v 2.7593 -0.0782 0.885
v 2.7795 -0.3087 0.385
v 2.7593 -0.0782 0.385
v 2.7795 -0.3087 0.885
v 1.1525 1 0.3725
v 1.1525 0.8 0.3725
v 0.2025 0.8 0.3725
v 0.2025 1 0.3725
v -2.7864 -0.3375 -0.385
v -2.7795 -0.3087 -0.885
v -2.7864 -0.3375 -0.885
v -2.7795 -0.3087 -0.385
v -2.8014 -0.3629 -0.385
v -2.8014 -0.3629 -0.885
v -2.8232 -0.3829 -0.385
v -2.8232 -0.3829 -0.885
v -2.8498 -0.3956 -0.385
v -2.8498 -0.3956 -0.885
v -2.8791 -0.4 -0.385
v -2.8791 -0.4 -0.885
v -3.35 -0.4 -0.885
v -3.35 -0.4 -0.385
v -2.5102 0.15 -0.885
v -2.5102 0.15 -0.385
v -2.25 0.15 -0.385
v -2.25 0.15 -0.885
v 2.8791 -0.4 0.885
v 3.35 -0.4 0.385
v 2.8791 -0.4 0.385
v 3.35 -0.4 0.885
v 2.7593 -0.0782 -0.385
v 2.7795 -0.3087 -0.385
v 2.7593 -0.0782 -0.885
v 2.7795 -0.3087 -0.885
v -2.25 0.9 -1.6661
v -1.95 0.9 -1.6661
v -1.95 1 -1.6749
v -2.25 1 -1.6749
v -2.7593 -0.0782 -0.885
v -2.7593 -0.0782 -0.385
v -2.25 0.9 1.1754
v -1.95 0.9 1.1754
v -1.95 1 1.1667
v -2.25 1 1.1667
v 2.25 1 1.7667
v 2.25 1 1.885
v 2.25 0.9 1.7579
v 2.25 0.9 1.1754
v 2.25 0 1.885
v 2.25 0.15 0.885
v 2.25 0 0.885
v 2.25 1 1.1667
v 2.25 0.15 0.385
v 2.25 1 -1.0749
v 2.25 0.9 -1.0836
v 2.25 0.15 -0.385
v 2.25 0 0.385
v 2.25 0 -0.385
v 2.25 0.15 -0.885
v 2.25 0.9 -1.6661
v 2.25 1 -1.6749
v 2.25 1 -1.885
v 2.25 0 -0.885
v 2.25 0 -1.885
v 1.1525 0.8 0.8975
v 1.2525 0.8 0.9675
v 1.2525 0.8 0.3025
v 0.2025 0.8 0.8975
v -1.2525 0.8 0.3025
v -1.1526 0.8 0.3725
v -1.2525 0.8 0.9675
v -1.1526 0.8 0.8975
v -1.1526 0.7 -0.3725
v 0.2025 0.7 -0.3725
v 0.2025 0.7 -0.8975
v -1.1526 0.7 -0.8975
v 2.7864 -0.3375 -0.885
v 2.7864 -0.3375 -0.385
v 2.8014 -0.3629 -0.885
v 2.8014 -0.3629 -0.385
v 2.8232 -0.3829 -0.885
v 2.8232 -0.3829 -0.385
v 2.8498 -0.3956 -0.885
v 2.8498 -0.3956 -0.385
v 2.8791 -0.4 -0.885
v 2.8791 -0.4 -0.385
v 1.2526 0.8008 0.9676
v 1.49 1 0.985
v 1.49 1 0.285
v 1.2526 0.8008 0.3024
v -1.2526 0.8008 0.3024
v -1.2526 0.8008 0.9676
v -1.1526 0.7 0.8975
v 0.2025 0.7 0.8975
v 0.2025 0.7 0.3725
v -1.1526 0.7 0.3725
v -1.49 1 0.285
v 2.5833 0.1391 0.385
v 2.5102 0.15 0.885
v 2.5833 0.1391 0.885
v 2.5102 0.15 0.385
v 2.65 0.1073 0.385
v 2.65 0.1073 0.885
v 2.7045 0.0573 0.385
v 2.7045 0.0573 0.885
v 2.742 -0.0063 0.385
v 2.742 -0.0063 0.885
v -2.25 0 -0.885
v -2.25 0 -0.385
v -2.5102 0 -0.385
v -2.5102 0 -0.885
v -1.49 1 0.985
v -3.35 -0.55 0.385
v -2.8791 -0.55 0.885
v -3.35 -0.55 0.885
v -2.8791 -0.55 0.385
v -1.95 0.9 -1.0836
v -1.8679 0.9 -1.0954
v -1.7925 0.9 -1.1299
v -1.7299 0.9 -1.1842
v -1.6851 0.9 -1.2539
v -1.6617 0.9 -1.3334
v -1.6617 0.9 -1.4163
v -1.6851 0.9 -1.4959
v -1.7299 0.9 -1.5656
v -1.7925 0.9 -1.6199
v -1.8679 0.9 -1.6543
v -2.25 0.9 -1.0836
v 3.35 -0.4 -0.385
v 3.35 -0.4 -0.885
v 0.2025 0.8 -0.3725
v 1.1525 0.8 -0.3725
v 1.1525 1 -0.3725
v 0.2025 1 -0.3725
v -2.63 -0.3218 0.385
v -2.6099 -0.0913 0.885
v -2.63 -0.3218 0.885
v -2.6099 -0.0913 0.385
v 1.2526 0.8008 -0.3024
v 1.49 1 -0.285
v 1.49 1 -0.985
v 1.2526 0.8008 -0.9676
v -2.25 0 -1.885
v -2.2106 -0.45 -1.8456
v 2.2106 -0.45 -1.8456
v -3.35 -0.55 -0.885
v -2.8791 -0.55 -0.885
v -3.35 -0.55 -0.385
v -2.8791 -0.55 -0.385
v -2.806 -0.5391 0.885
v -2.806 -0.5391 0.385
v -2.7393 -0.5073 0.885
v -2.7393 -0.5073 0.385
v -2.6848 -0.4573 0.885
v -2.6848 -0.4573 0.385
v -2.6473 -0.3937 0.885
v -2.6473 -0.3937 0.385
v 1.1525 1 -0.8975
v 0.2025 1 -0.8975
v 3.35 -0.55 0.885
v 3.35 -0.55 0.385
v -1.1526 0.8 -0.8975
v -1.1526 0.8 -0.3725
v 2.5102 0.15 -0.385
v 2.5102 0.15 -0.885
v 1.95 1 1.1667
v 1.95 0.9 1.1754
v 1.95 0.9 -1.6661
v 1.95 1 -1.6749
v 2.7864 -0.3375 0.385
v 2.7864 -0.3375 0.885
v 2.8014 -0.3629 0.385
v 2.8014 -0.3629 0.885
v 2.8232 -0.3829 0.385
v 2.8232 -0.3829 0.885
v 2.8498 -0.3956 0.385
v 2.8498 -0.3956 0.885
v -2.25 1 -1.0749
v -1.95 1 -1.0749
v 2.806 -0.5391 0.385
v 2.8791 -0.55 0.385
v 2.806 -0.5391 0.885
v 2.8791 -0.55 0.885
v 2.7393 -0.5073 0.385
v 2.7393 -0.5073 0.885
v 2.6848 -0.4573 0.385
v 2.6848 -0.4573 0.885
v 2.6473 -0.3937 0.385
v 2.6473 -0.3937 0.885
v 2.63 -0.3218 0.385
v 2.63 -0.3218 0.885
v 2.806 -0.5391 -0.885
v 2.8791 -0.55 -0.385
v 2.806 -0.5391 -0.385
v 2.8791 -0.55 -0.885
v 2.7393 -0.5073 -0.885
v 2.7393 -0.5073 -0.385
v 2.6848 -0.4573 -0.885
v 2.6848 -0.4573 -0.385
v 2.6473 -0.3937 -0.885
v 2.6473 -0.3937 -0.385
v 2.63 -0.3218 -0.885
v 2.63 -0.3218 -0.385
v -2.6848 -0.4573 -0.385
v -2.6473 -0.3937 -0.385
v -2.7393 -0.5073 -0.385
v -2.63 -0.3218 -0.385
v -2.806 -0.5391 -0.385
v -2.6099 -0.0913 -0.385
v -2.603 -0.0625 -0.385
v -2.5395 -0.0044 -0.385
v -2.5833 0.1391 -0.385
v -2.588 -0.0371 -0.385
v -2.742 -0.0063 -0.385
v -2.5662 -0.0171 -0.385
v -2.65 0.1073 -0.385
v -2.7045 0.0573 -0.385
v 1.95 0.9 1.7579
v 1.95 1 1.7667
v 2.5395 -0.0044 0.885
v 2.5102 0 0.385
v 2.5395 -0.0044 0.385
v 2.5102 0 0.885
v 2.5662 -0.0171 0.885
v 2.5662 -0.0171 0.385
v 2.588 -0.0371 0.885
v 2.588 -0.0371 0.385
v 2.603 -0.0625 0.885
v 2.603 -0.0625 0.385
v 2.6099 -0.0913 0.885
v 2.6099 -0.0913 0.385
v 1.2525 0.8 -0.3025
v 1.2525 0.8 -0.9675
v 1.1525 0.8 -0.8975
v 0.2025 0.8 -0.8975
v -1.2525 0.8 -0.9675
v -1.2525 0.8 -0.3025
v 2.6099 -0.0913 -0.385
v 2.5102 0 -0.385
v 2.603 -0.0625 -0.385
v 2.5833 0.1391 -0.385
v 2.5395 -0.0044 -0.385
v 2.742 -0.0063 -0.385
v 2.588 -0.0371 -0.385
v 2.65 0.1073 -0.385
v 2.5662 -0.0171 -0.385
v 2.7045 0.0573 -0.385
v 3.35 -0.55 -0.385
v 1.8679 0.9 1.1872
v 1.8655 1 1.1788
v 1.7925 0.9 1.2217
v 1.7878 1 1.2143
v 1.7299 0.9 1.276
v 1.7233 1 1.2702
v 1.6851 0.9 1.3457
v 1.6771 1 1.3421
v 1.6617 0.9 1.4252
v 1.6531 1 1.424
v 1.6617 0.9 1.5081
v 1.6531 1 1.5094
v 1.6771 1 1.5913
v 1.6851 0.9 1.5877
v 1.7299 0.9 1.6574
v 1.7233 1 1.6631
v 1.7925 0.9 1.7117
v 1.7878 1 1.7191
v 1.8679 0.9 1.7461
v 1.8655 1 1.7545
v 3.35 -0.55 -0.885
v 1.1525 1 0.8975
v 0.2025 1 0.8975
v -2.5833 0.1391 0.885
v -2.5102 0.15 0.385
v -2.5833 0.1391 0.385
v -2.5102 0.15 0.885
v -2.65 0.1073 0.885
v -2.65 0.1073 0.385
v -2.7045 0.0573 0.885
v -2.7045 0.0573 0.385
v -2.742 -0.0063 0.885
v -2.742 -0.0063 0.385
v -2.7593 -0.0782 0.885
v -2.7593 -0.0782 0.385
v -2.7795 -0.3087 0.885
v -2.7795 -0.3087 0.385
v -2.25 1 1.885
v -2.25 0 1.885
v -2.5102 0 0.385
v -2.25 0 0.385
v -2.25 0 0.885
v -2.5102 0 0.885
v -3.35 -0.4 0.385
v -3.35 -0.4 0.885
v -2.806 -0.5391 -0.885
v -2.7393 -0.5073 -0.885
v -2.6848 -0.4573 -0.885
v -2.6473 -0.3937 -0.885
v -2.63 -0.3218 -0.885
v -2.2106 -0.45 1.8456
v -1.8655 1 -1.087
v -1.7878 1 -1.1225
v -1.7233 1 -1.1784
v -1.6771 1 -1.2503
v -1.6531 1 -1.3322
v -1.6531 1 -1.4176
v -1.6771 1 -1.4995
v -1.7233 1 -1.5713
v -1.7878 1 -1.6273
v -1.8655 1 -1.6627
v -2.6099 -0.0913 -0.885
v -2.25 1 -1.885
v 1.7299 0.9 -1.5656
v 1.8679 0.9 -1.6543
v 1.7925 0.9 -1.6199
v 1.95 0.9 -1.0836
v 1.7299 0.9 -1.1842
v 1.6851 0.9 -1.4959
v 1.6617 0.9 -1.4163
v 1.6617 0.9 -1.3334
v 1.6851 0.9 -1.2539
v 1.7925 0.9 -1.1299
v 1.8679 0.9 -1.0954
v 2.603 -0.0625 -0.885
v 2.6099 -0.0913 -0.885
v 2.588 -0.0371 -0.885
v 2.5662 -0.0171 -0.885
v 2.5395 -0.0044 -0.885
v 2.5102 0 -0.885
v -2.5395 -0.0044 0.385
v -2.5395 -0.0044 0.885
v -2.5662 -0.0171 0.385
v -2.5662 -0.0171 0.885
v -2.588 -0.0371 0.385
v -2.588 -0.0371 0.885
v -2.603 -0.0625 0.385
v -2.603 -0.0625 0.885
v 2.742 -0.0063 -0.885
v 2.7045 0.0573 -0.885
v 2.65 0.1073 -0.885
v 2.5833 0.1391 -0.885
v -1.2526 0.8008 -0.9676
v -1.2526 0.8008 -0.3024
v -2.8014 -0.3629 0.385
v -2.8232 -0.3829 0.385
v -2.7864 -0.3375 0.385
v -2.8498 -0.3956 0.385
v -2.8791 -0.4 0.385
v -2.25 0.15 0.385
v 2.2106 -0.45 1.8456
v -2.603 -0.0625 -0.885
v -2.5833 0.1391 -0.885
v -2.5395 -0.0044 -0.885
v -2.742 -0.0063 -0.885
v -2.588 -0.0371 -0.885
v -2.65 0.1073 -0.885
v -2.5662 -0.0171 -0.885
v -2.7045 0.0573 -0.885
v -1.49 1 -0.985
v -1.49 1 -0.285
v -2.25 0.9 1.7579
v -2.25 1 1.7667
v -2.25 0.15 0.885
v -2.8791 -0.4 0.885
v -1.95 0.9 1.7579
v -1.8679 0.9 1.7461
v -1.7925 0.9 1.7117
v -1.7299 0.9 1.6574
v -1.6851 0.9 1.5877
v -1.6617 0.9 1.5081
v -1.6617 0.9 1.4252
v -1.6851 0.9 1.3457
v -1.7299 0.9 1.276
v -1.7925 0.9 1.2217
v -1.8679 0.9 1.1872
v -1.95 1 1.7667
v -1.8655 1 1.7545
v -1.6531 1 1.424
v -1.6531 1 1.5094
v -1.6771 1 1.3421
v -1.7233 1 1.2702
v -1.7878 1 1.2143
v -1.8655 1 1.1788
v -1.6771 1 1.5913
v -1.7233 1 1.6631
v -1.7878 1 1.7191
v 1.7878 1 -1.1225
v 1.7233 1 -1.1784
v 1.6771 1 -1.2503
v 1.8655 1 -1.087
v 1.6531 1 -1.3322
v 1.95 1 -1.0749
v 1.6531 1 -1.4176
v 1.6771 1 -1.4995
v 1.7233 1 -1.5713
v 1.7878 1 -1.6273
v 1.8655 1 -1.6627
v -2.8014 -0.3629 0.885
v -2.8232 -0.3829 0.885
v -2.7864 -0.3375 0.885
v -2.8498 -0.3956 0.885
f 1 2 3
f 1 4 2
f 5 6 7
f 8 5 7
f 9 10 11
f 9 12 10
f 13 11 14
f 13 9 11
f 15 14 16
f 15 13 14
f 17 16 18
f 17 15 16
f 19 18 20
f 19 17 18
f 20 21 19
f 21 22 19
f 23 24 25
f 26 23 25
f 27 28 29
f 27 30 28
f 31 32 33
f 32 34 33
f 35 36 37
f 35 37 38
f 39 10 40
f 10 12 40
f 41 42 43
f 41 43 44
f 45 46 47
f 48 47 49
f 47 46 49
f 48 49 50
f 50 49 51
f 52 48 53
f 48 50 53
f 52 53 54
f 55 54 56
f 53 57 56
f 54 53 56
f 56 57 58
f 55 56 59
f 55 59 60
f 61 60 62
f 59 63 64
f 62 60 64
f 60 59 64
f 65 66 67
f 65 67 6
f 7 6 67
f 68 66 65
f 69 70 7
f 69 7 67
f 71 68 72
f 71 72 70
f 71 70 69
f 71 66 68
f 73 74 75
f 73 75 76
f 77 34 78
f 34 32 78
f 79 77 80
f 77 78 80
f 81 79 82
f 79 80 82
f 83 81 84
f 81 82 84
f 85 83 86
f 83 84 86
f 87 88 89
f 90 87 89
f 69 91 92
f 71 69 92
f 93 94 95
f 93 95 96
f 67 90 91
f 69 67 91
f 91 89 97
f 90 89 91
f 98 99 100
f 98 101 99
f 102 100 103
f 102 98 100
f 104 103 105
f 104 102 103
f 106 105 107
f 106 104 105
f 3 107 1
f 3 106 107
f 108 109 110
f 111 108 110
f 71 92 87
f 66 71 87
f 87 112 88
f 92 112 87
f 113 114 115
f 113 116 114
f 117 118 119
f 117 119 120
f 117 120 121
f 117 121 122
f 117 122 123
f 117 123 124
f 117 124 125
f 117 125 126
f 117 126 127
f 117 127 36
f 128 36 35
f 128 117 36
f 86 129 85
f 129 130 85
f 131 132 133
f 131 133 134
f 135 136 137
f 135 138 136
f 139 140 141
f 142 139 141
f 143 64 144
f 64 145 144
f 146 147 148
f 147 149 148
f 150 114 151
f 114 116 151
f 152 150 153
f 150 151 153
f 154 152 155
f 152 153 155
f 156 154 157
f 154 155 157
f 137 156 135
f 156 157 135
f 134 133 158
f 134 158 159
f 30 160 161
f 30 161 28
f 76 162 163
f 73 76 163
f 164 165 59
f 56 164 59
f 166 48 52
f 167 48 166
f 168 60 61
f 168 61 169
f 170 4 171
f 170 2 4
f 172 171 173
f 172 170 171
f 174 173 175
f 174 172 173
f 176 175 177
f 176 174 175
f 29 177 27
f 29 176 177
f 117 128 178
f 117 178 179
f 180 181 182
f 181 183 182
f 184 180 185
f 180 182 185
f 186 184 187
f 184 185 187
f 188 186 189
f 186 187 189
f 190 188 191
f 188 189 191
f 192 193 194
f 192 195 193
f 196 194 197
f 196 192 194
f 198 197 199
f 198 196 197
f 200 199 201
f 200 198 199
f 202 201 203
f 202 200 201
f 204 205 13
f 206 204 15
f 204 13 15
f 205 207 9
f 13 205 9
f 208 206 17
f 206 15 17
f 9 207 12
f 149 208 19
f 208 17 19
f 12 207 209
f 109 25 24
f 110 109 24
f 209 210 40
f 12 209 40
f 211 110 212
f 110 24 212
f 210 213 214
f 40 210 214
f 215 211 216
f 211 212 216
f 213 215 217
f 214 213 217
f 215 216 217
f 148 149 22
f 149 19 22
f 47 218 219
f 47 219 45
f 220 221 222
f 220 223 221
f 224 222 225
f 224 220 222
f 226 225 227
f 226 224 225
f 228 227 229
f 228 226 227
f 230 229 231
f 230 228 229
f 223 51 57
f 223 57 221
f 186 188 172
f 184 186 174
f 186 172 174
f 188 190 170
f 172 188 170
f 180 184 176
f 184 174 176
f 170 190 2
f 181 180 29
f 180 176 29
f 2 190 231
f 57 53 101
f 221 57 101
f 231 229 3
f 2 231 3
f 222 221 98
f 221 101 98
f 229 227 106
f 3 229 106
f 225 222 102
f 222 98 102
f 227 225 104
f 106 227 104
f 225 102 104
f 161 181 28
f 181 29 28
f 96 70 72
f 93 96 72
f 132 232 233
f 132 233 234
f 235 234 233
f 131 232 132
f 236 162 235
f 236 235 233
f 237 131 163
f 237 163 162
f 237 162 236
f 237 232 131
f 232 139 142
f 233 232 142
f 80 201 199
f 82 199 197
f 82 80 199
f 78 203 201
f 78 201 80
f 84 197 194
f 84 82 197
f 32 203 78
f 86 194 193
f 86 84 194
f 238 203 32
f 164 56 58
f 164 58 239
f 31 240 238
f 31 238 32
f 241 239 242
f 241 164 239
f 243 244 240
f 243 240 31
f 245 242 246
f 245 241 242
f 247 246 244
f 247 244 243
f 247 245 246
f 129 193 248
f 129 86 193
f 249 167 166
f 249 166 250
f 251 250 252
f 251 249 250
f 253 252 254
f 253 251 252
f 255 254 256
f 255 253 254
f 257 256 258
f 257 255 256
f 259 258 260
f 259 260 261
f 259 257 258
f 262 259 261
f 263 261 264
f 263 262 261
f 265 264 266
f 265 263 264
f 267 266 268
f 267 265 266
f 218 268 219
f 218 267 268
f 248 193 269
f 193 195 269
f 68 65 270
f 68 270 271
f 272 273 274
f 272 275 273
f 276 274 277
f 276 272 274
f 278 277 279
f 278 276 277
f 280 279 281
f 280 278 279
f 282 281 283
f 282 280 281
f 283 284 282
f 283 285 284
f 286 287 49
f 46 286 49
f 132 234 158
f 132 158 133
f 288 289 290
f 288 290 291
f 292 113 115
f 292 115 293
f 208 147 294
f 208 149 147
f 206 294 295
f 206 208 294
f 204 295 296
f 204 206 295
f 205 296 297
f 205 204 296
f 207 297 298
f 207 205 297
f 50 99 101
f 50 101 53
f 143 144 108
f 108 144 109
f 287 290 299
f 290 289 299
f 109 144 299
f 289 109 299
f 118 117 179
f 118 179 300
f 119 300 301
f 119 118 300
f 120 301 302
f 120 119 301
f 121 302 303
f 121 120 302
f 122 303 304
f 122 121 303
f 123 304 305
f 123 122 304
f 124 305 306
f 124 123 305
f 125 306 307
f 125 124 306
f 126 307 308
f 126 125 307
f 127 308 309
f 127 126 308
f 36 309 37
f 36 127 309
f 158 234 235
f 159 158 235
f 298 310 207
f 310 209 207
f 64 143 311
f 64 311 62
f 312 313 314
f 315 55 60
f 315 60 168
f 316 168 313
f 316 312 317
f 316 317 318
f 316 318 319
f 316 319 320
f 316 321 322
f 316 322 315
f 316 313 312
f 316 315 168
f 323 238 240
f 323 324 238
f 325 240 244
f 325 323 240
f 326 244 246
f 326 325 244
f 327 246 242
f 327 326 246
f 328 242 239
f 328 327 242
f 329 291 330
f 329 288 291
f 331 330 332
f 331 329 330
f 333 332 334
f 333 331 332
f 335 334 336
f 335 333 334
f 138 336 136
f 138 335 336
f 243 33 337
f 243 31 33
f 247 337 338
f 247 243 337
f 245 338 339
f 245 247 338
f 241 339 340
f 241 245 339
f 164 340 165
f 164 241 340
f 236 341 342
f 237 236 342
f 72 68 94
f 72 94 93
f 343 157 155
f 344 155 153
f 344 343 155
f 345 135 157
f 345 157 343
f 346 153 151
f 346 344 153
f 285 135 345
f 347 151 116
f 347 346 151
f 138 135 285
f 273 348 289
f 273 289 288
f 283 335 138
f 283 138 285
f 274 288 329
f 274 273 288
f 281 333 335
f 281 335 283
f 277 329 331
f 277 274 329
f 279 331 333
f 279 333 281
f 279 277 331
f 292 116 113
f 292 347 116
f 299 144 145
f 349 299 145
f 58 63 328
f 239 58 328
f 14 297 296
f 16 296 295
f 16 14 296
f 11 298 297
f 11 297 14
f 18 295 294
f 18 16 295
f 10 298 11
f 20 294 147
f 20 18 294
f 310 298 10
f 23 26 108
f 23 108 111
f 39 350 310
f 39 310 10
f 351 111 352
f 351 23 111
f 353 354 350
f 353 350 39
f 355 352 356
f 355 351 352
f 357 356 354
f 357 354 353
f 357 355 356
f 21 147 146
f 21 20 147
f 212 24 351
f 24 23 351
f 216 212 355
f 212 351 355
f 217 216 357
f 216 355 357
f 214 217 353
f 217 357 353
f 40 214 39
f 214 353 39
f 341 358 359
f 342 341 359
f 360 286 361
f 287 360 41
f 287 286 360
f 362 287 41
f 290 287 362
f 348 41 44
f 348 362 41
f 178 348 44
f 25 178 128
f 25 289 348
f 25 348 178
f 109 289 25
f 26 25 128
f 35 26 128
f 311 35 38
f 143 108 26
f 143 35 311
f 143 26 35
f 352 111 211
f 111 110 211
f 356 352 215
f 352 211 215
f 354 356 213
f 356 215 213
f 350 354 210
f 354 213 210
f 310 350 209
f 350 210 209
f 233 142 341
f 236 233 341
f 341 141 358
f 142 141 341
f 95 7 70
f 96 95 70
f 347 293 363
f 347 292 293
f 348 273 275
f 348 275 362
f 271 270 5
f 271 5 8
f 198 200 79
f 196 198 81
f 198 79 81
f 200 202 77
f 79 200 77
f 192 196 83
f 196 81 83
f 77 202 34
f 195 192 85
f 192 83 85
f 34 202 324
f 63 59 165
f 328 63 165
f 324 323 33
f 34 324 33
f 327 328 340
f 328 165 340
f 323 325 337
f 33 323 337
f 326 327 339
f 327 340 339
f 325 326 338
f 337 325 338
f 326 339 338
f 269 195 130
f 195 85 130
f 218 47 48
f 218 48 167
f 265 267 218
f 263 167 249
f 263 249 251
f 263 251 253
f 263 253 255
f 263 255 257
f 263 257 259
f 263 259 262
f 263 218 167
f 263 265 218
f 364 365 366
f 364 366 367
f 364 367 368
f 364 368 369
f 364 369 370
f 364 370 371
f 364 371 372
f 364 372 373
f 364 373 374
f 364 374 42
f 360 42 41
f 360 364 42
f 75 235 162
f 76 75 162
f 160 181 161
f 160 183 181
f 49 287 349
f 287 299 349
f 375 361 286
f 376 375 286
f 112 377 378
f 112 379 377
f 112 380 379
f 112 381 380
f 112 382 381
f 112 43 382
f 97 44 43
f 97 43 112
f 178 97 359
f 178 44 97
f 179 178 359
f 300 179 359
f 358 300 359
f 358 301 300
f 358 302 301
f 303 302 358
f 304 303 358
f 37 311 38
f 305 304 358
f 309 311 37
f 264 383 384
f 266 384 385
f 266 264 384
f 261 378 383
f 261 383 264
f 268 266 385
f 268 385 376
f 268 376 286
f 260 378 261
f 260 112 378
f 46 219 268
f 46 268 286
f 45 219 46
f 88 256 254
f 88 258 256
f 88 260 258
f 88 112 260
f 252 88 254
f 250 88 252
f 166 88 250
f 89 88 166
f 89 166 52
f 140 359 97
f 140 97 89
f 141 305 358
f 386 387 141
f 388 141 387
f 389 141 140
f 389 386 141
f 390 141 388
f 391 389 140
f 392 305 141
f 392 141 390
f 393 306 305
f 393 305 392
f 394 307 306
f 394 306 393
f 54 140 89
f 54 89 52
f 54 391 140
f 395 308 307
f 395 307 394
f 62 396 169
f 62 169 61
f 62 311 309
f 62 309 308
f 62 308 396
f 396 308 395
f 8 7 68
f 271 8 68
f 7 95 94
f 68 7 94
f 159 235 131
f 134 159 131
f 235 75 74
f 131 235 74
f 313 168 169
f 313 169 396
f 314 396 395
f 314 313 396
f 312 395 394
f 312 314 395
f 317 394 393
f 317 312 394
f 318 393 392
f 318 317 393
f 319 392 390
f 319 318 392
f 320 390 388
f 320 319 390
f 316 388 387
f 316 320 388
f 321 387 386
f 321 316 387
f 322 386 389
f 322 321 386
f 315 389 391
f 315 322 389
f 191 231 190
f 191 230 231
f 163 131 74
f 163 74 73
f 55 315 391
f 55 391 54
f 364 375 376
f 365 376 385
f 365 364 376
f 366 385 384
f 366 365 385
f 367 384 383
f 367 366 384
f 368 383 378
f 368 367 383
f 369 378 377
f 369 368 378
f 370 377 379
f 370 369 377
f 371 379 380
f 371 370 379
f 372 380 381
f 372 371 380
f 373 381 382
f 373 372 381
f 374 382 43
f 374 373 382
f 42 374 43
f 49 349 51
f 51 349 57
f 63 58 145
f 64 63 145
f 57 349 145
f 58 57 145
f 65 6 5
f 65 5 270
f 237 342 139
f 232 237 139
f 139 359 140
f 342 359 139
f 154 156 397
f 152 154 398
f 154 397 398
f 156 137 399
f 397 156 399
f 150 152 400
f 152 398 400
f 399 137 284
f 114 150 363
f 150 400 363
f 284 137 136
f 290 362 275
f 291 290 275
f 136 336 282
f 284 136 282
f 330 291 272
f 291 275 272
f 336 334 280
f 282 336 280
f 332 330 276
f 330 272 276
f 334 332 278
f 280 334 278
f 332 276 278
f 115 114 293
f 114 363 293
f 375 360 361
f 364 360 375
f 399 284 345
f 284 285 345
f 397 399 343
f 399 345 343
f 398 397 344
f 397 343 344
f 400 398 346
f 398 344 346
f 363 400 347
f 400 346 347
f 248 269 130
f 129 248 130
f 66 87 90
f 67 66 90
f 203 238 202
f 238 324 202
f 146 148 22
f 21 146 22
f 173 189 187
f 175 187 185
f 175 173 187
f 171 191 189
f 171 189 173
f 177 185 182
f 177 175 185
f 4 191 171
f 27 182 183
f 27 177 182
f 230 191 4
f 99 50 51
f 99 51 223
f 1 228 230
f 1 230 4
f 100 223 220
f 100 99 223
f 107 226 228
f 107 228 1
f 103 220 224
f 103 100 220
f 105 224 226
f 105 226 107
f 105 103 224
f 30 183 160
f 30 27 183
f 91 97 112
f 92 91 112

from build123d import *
from OCP.BRepFilletAPI import BRepFilletAPI_MakeChamfer

# Parameters (mm, degrees)
SKETCH1_W                    = 4.5
SKETCH1_H                    = 3.77
EXTRUDE1_DEPTH               = 1
EXTRUDE1_OTHER_WAY_DEPTH     = 0.45
EXTRUDE1_OTHER_WAY_TAPER     = 5
EXTRUDE2_START               = 0.635
EXTRUDE2_DEPTH               = 0.25
FILLET1_R                    = 0.1
FILLET2_R                    = 0.25
CUT_EXTRUDE2_DEPTH           = 0.1
CUT_EXTRUDE2_DRAFT           = -5
CUT_EXTRUDE2_2_DEPTH         = 0.1
CUT_EXTRUDE2_2_DRAFT         = -5
CUT_EXTRUDE2_3_DEPTH         = 0.1
CUT_EXTRUDE2_3_DRAFT         = -5
CUT_EXTRUDE2_4_DEPTH         = 0.1
CUT_EXTRUDE2_4_DRAFT         = -5
CUT_EXTRUDE3_DEPTH           = 0.2
CUT_EXTRUDE3_DRAFT           = -5
CUT_EXTRUDE3_PROFILE_2_DEPTH = 0.2
CUT_EXTRUDE3_PROFILE_2_DRAFT = -5
CHAMFER1_SIZE                = 0.2
CHAMFER1_SIZE2               = 0.220012574
SKETCH5_W                    = 2.305071118
SKETCH5_H                    = 0.525004534
CUT_EXTRUDE4_DEPTH           = 0.1
SKETCH6_W                    = 0.95
SKETCH6_H                    = 0.525004534
EXTRUDE3_DEPTH               = 0.3


# Read off the part's stored shape, not the designer's step: Cut-Extrude2
with BuildPart() as part:
    # Sketch1 → Extrude1 (new body)
    with BuildSketch(Plane(origin=(0, 0, 0), x_dir=(1, 0, 0), z_dir=(0, 1, 0))):
        Rectangle(SKETCH1_W, SKETCH1_H)
    extrude(amount=EXTRUDE1_DEPTH)

    # Sketch1 → Extrude1 other way (add)
    with BuildSketch(Plane(origin=(0, 0, 0), x_dir=(1, 0, 0), z_dir=(0, 1, 0))):
        Rectangle(SKETCH1_W, SKETCH1_H)
    extrude(amount=-EXTRUDE1_OTHER_WAY_DEPTH, taper=EXTRUDE1_OTHER_WAY_TAPER)

    # Sketch2 → Extrude2 (add, symmetric)
    with BuildSketch(Plane.XY.offset(EXTRUDE2_START)):
        Polygon((-0.471718642, 0), (-2.601881235, 0), (-2.65, -0.55), (-3.35, -0.55), (-3.35, -0.4), (-2.787449676, -0.4), (-2.739330911, 0.15), (-0.471718642, 0.15), align=None)
        Polygon((0.471718642, 0.15), (0.471718642, 0), (2.601881235, 0), (2.65, -0.55), (3.35, -0.55), (3.35, -0.4), (2.787449676, -0.4), (2.739330911, 0.15), align=None)
    extrude2 = extrude(amount=EXTRUDE2_DEPTH, both=True)

    # Mirror1: Extrude2 across plane
    add(extrude2.mirror(Plane.XY))

    # Fillet1
    fillet1_edges = [part.edges().sort_by_distance(p)[0] for p in [
        (2.787449676, -0.4, -0.635),
        (2.601881235, 0, -0.635),
        (-2.787449676, -0.4, 0.635),
        (-2.601881235, 0, 0.635),
        (2.601881235, 0, 0.635),
        (2.787449676, -0.4, 0.635),
        (-2.601881235, 0, -0.635),
        (-2.787449676, -0.4, -0.635),
    ]]
    fillet(fillet1_edges, radius=FILLET1_R)

    # Fillet2
    fillet2_edges = [part.edges().sort_by_distance(p)[0] for p in [
        (2.739330911, 0.15, -0.635),
        (2.65, -0.55, -0.635),
        (-2.739330911, 0.15, 0.635),
        (-2.65, -0.55, 0.635),
        (2.739330911, 0.15, 0.635),
        (2.65, -0.55, 0.635),
        (-2.739330911, 0.15, -0.635),
        (-2.65, -0.55, -0.635),
    ]]
    fillet(fillet2_edges, radius=FILLET2_R)


with BuildPart() as cut_extrude2_tool:
    # Cut-Extrude2 outline → Cut-Extrude2 (with draft: the straight prism first)
    with BuildSketch(Plane(origin=(0, 0.9, 0), x_dir=(-1, 0, 0), z_dir=(0, 1, 0))):
        with BuildLine():
            Line((2.25, 1.175438394), (2.25, 1.757940661))
            Line((2.25, 1.757940661), (1.95, 1.757940661))
            ThreePointArc((1.95, 1.757940661), (1.658748866, 1.466689528), (1.95, 1.175438394))
            Line((1.95, 1.175438394), (2.25, 1.175438394))
        make_face()
    extrude(amount=CUT_EXTRUDE2_DEPTH)
    # Cut-Extrude2: the draft: its side faces are tilted about the plane it starts from
    cut_extrude2_sides = [cut_extrude2_tool.faces().sort_by_distance(p)[0] for p in [
        (-2.1, 0.95, 1.175438394),
        (-2.25, 0.95, 1.466689527),
        (-2.1, 0.95, 1.757940661),
        (-1.658748866, 0.95, 1.466689528),
    ]]
    draft(cut_extrude2_sides, Plane(origin=(0, 0.9, 0), x_dir=(-1, 0, 0), z_dir=(0, 1, 0)), CUT_EXTRUDE2_DRAFT)


with BuildPart() as part_1:
    add(part.part)

    # Cut-Extrude2: cut by cut_extrude2_tool
    add(cut_extrude2_tool.part, mode=Mode.SUBTRACT)


with BuildPart() as cut_extrude2_2_tool:
    # Cut-Extrude2 2 outline → Cut-Extrude2 2 (with draft: the straight prism first)
    with BuildSketch(Plane(origin=(0, 0.9, 0), x_dir=(-1, 0, 0), z_dir=(0, 1, 0))):
        with BuildLine():
            Line((2.25, -1.66613077), (2.25, -1.083628503))
            Line((2.25, -1.083628503), (1.95, -1.083628503))
            ThreePointArc((1.95, -1.083628503), (1.658748866, -1.374879636), (1.95, -1.66613077))
            Line((1.95, -1.66613077), (2.25, -1.66613077))
        make_face()
    extrude(amount=CUT_EXTRUDE2_2_DEPTH)
    # Cut-Extrude2 2: the draft: its side faces are tilted about the plane it starts from
    cut_extrude2_2_sides = [cut_extrude2_2_tool.faces().sort_by_distance(p)[0] for p in [
        (-2.25, 0.95, -1.374879637),
        (-2.1, 0.95, -1.083628503),
        (-1.658748866, 0.95, -1.374879637),
        (-2.1, 0.95, -1.66613077),
    ]]
    draft(cut_extrude2_2_sides, Plane(origin=(0, 0.9, 0), x_dir=(-1, 0, 0), z_dir=(0, 1, 0)), CUT_EXTRUDE2_2_DRAFT)


with BuildPart() as part_2:
    add(part_1.part)

    # Cut-Extrude2 2: cut by cut_extrude2_2_tool
    add(cut_extrude2_2_tool.part, mode=Mode.SUBTRACT)


with BuildPart() as cut_extrude2_3_tool:
    # Cut-Extrude2 3 outline → Cut-Extrude2 3 (with draft: the straight prism first)
    with BuildSketch(Plane(origin=(0, 0.9, 0), x_dir=(-1, 0, 0), z_dir=(0, 1, 0))):
        with BuildLine():
            Line((-2.25, -1.083628503), (-2.25, -1.66613077))
            Line((-2.25, -1.66613077), (-1.95, -1.66613077))
            ThreePointArc((-1.95, -1.66613077), (-1.658748866, -1.374879636), (-1.95, -1.083628503))
            Line((-1.95, -1.083628503), (-2.25, -1.083628503))
        make_face()
    extrude(amount=CUT_EXTRUDE2_3_DEPTH)
    # Cut-Extrude2 3: the draft: its side faces are tilted about the plane it starts from
    cut_extrude2_3_sides = [cut_extrude2_3_tool.faces().sort_by_distance(p)[0] for p in [
        (2.25, 0.95, -1.374879637),
        (2.1, 0.95, -1.66613077),
        (1.658748866, 0.95, -1.374879637),
        (2.1, 0.95, -1.083628503),
    ]]
    draft(cut_extrude2_3_sides, Plane(origin=(0, 0.9, 0), x_dir=(-1, 0, 0), z_dir=(0, 1, 0)), CUT_EXTRUDE2_3_DRAFT)


with BuildPart() as part_3:
    add(part_2.part)

    # Cut-Extrude2 3: cut by cut_extrude2_3_tool
    add(cut_extrude2_3_tool.part, mode=Mode.SUBTRACT)


with BuildPart() as cut_extrude2_4_tool:
    # Cut-Extrude2 4 outline → Cut-Extrude2 4 (with draft: the straight prism first)
    with BuildSketch(Plane(origin=(0, 0.9, 0), x_dir=(-1, 0, 0), z_dir=(0, 1, 0))):
        with BuildLine():
            Line((-2.25, 1.757940661), (-2.25, 1.175438394))
            Line((-2.25, 1.175438394), (-1.95, 1.175438394))
            ThreePointArc((-1.95, 1.175438394), (-1.658748866, 1.466689528), (-1.95, 1.757940661))
            Line((-1.95, 1.757940661), (-2.25, 1.757940661))
        make_face()
    extrude(amount=CUT_EXTRUDE2_4_DEPTH)
    # Cut-Extrude2 4: the draft: its side faces are tilted about the plane it starts from
    cut_extrude2_4_sides = [cut_extrude2_4_tool.faces().sort_by_distance(p)[0] for p in [
        (1.658748866, 0.95, 1.466689528),
        (2.1, 0.95, 1.757940661),
        (2.25, 0.95, 1.466689528),
        (2.1, 0.95, 1.175438394),
    ]]
    draft(cut_extrude2_4_sides, Plane(origin=(0, 0.9, 0), x_dir=(-1, 0, 0), z_dir=(0, 1, 0)), CUT_EXTRUDE2_4_DRAFT)


with BuildPart() as part_4:
    add(part_3.part)

    # Cut-Extrude2 4: cut by cut_extrude2_4_tool
    add(cut_extrude2_4_tool.part, mode=Mode.SUBTRACT)


with BuildPart() as cut_extrude3_tool:
    # Sketch4 → Cut-Extrude3 (with draft: the straight prism first)
    with BuildSketch(Plane(origin=(0, 1, 0), x_dir=(-1, 0, 0), z_dir=(0, 1, 0))):
        Polygon((1.27, 0.635), (1.27, 0.985), (-1.27, 0.985), (-1.27, 0.285), (1.27, 0.285), align=None)
    extrude(amount=-CUT_EXTRUDE3_DEPTH)
    # Cut-Extrude3: the draft: its side faces are tilted about the plane it starts from
    cut_extrude3_sides = [cut_extrude3_tool.faces().sort_by_distance(p)[0] for p in [
        (-1.27, 0.9, 0.635),
        (1.27, 0.9, 0.635),
        (0, 0.9, 0.285),
        (0, 0.9, 0.985),
    ]]
    draft(cut_extrude3_sides, Plane(origin=(0, 1, 0), x_dir=(-1, 0, 0), z_dir=(0, 1, 0)), CUT_EXTRUDE3_DRAFT)


with BuildPart() as part_5:
    add(part_4.part)

    # Cut-Extrude3: cut by cut_extrude3_tool
    add(cut_extrude3_tool.part, mode=Mode.SUBTRACT)


with BuildPart() as cut_extrude3_profile_2_tool:
    # Sketch4 → Cut-Extrude3 profile 2 (with draft: the straight prism first)
    with BuildSketch(Plane(origin=(0, 1, 0), x_dir=(-1, 0, 0), z_dir=(0, 1, 0))):
        Polygon((-1.27, -0.985), (1.27, -0.985), (1.27, -0.635), (1.27, -0.285), (-1.27, -0.285), align=None)
    extrude(amount=-CUT_EXTRUDE3_PROFILE_2_DEPTH)
    # Cut-Extrude3 profile 2: the draft: its side faces are tilted about the plane it starts from
    cut_extrude3_profile_2_sides = [cut_extrude3_profile_2_tool.faces().sort_by_distance(p)[0] for p in [
        (0, 0.9, -0.985),
        (0, 0.9, -0.285),
        (-1.27, 0.9, -0.635),
        (1.27, 0.9, -0.635),
    ]]
    draft(cut_extrude3_profile_2_sides, Plane(origin=(0, 1, 0), x_dir=(-1, 0, 0), z_dir=(0, 1, 0)), CUT_EXTRUDE3_PROFILE_2_DRAFT)


with BuildPart() as part_6:
    add(part_5.part)

    # Cut-Extrude3 profile 2: cut by cut_extrude3_profile_2_tool
    add(cut_extrude3_profile_2_tool.part, mode=Mode.SUBTRACT)

    # Chamfer1: one chamfer whose edges measure the first distance from different faces: ONE call of the kernel's chamfer builder (chamfer() names one face for all edges)
    chamfer1_edges_1 = [part_6.edges().sort_by_distance(p)[0] for p in [
        (1.27, 1, -0.635),
    ]]
    chamfer1_side_1 = [part_6.faces().sort_by_distance(p)[0] for p in [
        (1.2613259, 0.900854587, -0.635),
    ]]
    chamfer1_edges_2 = [part_6.edges().sort_by_distance(p)[0] for p in [
        (-1.27, 1, -0.635),
    ]]
    chamfer1_side_2 = [part_6.faces().sort_by_distance(p)[0] for p in [
        (-1.2613259, 0.900854587, -0.635),
    ]]
    chamfer1_edges_3 = [part_6.edges().sort_by_distance(p)[0] for p in [
        (1.27, 1, 0.635),
    ]]
    chamfer1_side_3 = [part_6.faces().sort_by_distance(p)[0] for p in [
        (1.2613259, 0.900854587, 0.635),
    ]]
    chamfer1_edges_4 = [part_6.edges().sort_by_distance(p)[0] for p in [
        (-1.27, 1, 0.635),
    ]]
    chamfer1_side_4 = [part_6.faces().sort_by_distance(p)[0] for p in [
        (-1.2613259, 0.900854587, 0.635),
    ]]
    chamfer1 = BRepFilletAPI_MakeChamfer(part_6.part.solid().wrapped)
    for e in chamfer1_edges_1:
        chamfer1.Add(CHAMFER1_SIZE, CHAMFER1_SIZE2, e.wrapped, chamfer1_side_1[0].wrapped)  # the first distance lies on this face
    for e in chamfer1_edges_2:
        chamfer1.Add(CHAMFER1_SIZE, CHAMFER1_SIZE2, e.wrapped, chamfer1_side_2[0].wrapped)  # the first distance lies on this face
    for e in chamfer1_edges_3:
        chamfer1.Add(CHAMFER1_SIZE, CHAMFER1_SIZE2, e.wrapped, chamfer1_side_3[0].wrapped)  # the first distance lies on this face
    for e in chamfer1_edges_4:
        chamfer1.Add(CHAMFER1_SIZE, CHAMFER1_SIZE2, e.wrapped, chamfer1_side_4[0].wrapped)  # the first distance lies on this face
    add(Compound.cast(chamfer1.Shape()), mode=Mode.REPLACE)

    # Sketch5 → Cut-Extrude4 (cut)
    with BuildSketch(Plane(origin=(0, 0.8, 0), x_dir=(-1, 0, 0), z_dir=(0, 1, 0))):
        with Locations((3.3292e-05, 0.635)):
            Rectangle(SKETCH5_W, SKETCH5_H)
        with Locations((3.3292e-05, -0.635)):
            Rectangle(SKETCH5_W, SKETCH5_H)
    extrude(amount=-CUT_EXTRUDE4_DEPTH, mode=Mode.SUBTRACT)

    # Sketch6 → Extrude3 (add)
    with BuildSketch(Plane(origin=(0, 0.7, 0), x_dir=(-1, 0, 0), z_dir=(0, 1, 0))):
        with Locations((-0.677502267, 0.635)):
            Rectangle(SKETCH6_W, SKETCH6_H)
        with Locations((-0.677502267, -0.635)):
            Rectangle(SKETCH6_W, SKETCH6_H)
    extrude(amount=EXTRUDE3_DEPTH)


solid = part_6.part
